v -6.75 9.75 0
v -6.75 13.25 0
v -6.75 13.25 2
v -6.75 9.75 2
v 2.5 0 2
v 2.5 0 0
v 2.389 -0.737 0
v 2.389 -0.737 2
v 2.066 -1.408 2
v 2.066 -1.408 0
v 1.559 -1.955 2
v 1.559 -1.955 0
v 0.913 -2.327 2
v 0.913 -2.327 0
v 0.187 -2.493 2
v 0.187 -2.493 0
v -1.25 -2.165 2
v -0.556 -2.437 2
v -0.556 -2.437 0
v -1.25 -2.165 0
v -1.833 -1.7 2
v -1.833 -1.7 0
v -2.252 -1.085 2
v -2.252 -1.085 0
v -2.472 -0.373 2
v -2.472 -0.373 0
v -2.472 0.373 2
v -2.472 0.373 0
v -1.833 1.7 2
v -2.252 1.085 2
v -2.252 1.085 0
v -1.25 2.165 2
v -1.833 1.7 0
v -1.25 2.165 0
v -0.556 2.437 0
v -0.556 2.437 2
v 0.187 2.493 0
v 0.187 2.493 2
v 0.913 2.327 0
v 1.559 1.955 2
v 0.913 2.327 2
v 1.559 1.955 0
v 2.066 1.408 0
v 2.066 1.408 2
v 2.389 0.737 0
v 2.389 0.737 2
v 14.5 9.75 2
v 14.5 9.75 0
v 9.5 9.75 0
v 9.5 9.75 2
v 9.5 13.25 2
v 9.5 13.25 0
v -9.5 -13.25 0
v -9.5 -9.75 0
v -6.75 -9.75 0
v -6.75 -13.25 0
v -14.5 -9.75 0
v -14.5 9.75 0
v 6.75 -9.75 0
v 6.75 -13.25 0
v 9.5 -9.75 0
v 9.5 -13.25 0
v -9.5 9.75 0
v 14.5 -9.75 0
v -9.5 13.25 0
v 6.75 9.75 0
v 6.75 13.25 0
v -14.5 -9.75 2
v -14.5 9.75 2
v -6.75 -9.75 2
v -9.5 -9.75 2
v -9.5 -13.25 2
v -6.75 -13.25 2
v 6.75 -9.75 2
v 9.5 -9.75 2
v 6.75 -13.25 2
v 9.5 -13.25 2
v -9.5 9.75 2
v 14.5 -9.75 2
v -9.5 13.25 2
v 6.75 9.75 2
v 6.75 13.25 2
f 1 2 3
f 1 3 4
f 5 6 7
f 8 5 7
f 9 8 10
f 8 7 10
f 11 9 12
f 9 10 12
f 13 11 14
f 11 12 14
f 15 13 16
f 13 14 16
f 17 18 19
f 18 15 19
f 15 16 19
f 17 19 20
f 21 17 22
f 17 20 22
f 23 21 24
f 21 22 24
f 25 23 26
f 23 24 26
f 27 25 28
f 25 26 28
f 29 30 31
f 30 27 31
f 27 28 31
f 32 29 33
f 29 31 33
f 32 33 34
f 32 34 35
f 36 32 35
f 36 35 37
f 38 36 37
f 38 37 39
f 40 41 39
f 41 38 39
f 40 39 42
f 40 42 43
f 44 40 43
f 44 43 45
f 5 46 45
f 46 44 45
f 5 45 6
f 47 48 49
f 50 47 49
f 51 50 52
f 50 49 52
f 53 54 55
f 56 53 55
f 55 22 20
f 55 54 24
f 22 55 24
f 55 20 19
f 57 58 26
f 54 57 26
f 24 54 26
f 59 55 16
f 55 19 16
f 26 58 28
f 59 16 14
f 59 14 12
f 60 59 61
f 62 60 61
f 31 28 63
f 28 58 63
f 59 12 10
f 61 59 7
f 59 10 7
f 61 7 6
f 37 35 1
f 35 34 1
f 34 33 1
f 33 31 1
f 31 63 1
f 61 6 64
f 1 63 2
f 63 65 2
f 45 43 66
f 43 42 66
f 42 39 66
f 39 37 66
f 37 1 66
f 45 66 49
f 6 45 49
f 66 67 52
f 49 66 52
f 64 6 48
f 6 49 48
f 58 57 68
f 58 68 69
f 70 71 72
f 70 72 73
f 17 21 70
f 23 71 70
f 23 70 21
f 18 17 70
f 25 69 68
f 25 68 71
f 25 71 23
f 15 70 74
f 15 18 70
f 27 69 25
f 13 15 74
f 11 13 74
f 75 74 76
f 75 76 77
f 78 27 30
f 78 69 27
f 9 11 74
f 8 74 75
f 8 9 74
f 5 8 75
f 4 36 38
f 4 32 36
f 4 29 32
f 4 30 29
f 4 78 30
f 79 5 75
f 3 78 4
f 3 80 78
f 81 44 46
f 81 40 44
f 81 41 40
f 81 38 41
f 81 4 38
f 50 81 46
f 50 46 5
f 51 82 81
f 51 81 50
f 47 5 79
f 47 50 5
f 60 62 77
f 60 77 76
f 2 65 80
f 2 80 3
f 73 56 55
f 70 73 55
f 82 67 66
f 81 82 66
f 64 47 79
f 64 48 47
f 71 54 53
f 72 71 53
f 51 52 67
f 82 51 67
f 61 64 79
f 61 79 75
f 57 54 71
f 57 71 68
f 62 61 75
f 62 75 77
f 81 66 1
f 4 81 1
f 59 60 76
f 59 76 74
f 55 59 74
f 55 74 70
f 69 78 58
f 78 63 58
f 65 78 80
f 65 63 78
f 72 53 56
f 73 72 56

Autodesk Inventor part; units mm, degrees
ref_plane "YZ Plane" through (0, 0, 0) normal (1, 0, 0) x (0, 1, 0)
ref_plane "XZ Plane" through (0, 0, 0) normal (0, 1, 0) x (-1, 0, 0)
ref_plane "XY Plane" through (0, 0, 0) normal (0, 0, 1) x (1, 0, 0)
sketch "Эскиз1" plane through (0, 0, 0) normal (0, 0, 1) x (1, 0, 0)
  line L0 (14.5, 9.75) -> (14.5, -9.75)
  line L1 (-14.5, -9.75) -> (-14.5, 9.75)
  line L2 (9.5, 9.75) -> (9.5, 13.25)
  line L3 (9.5, 13.25) -> (6.75, 13.25)
  line L4 (6.75, 13.25) -> (6.75, 9.75)
  line L5 (-9.5, 9.75) -> (-9.5, 13.25)
  line L6 (-9.5, 13.25) -> (-6.75, 13.25)
  line L7 (-6.75, 13.25) -> (-6.75, 9.75)
  line L8 (9.5, -9.75) -> (9.5, -13.25)
  line L9 (9.5, -13.25) -> (6.75, -13.25)
  line L10 (6.75, -13.25) -> (6.75, -9.75)
  line L11 (-6.75, -13.25) -> (-6.75, -9.75)
  line L12 (-9.5, -13.25) -> (-6.75, -13.25)
  line L13 (-9.5, -9.75) -> (-9.5, -13.25)
  line L14 (14.5, 9.75) -> (9.5, 9.75)
  line L15 (6.75, 9.75) -> (-6.75, 9.75)
  line L16 (-9.5, 9.75) -> (-14.5, 9.75)
  line L17 (-9.5, -9.75) -> (-14.5, -9.75)
  line L18 (14.5, -9.75) -> (9.5, -9.75)
  line L19 (6.75, -9.75) -> (-6.75, -9.75)
  circle A0 centre (0, 0) radius 2.5
  point P0 (-14.5, 0)
  dimension "d0" = 29
  dimension "d1" = 19.5
  dimension "d2" = 5
  dimension "d3" = 3.5
  dimension "d4" = 2.75
  dimension "d7" = 5
extrude "Выдавливание1" add sketch "Эскиз1" along normal blind 2
properties part number "Крепеж колеса"
